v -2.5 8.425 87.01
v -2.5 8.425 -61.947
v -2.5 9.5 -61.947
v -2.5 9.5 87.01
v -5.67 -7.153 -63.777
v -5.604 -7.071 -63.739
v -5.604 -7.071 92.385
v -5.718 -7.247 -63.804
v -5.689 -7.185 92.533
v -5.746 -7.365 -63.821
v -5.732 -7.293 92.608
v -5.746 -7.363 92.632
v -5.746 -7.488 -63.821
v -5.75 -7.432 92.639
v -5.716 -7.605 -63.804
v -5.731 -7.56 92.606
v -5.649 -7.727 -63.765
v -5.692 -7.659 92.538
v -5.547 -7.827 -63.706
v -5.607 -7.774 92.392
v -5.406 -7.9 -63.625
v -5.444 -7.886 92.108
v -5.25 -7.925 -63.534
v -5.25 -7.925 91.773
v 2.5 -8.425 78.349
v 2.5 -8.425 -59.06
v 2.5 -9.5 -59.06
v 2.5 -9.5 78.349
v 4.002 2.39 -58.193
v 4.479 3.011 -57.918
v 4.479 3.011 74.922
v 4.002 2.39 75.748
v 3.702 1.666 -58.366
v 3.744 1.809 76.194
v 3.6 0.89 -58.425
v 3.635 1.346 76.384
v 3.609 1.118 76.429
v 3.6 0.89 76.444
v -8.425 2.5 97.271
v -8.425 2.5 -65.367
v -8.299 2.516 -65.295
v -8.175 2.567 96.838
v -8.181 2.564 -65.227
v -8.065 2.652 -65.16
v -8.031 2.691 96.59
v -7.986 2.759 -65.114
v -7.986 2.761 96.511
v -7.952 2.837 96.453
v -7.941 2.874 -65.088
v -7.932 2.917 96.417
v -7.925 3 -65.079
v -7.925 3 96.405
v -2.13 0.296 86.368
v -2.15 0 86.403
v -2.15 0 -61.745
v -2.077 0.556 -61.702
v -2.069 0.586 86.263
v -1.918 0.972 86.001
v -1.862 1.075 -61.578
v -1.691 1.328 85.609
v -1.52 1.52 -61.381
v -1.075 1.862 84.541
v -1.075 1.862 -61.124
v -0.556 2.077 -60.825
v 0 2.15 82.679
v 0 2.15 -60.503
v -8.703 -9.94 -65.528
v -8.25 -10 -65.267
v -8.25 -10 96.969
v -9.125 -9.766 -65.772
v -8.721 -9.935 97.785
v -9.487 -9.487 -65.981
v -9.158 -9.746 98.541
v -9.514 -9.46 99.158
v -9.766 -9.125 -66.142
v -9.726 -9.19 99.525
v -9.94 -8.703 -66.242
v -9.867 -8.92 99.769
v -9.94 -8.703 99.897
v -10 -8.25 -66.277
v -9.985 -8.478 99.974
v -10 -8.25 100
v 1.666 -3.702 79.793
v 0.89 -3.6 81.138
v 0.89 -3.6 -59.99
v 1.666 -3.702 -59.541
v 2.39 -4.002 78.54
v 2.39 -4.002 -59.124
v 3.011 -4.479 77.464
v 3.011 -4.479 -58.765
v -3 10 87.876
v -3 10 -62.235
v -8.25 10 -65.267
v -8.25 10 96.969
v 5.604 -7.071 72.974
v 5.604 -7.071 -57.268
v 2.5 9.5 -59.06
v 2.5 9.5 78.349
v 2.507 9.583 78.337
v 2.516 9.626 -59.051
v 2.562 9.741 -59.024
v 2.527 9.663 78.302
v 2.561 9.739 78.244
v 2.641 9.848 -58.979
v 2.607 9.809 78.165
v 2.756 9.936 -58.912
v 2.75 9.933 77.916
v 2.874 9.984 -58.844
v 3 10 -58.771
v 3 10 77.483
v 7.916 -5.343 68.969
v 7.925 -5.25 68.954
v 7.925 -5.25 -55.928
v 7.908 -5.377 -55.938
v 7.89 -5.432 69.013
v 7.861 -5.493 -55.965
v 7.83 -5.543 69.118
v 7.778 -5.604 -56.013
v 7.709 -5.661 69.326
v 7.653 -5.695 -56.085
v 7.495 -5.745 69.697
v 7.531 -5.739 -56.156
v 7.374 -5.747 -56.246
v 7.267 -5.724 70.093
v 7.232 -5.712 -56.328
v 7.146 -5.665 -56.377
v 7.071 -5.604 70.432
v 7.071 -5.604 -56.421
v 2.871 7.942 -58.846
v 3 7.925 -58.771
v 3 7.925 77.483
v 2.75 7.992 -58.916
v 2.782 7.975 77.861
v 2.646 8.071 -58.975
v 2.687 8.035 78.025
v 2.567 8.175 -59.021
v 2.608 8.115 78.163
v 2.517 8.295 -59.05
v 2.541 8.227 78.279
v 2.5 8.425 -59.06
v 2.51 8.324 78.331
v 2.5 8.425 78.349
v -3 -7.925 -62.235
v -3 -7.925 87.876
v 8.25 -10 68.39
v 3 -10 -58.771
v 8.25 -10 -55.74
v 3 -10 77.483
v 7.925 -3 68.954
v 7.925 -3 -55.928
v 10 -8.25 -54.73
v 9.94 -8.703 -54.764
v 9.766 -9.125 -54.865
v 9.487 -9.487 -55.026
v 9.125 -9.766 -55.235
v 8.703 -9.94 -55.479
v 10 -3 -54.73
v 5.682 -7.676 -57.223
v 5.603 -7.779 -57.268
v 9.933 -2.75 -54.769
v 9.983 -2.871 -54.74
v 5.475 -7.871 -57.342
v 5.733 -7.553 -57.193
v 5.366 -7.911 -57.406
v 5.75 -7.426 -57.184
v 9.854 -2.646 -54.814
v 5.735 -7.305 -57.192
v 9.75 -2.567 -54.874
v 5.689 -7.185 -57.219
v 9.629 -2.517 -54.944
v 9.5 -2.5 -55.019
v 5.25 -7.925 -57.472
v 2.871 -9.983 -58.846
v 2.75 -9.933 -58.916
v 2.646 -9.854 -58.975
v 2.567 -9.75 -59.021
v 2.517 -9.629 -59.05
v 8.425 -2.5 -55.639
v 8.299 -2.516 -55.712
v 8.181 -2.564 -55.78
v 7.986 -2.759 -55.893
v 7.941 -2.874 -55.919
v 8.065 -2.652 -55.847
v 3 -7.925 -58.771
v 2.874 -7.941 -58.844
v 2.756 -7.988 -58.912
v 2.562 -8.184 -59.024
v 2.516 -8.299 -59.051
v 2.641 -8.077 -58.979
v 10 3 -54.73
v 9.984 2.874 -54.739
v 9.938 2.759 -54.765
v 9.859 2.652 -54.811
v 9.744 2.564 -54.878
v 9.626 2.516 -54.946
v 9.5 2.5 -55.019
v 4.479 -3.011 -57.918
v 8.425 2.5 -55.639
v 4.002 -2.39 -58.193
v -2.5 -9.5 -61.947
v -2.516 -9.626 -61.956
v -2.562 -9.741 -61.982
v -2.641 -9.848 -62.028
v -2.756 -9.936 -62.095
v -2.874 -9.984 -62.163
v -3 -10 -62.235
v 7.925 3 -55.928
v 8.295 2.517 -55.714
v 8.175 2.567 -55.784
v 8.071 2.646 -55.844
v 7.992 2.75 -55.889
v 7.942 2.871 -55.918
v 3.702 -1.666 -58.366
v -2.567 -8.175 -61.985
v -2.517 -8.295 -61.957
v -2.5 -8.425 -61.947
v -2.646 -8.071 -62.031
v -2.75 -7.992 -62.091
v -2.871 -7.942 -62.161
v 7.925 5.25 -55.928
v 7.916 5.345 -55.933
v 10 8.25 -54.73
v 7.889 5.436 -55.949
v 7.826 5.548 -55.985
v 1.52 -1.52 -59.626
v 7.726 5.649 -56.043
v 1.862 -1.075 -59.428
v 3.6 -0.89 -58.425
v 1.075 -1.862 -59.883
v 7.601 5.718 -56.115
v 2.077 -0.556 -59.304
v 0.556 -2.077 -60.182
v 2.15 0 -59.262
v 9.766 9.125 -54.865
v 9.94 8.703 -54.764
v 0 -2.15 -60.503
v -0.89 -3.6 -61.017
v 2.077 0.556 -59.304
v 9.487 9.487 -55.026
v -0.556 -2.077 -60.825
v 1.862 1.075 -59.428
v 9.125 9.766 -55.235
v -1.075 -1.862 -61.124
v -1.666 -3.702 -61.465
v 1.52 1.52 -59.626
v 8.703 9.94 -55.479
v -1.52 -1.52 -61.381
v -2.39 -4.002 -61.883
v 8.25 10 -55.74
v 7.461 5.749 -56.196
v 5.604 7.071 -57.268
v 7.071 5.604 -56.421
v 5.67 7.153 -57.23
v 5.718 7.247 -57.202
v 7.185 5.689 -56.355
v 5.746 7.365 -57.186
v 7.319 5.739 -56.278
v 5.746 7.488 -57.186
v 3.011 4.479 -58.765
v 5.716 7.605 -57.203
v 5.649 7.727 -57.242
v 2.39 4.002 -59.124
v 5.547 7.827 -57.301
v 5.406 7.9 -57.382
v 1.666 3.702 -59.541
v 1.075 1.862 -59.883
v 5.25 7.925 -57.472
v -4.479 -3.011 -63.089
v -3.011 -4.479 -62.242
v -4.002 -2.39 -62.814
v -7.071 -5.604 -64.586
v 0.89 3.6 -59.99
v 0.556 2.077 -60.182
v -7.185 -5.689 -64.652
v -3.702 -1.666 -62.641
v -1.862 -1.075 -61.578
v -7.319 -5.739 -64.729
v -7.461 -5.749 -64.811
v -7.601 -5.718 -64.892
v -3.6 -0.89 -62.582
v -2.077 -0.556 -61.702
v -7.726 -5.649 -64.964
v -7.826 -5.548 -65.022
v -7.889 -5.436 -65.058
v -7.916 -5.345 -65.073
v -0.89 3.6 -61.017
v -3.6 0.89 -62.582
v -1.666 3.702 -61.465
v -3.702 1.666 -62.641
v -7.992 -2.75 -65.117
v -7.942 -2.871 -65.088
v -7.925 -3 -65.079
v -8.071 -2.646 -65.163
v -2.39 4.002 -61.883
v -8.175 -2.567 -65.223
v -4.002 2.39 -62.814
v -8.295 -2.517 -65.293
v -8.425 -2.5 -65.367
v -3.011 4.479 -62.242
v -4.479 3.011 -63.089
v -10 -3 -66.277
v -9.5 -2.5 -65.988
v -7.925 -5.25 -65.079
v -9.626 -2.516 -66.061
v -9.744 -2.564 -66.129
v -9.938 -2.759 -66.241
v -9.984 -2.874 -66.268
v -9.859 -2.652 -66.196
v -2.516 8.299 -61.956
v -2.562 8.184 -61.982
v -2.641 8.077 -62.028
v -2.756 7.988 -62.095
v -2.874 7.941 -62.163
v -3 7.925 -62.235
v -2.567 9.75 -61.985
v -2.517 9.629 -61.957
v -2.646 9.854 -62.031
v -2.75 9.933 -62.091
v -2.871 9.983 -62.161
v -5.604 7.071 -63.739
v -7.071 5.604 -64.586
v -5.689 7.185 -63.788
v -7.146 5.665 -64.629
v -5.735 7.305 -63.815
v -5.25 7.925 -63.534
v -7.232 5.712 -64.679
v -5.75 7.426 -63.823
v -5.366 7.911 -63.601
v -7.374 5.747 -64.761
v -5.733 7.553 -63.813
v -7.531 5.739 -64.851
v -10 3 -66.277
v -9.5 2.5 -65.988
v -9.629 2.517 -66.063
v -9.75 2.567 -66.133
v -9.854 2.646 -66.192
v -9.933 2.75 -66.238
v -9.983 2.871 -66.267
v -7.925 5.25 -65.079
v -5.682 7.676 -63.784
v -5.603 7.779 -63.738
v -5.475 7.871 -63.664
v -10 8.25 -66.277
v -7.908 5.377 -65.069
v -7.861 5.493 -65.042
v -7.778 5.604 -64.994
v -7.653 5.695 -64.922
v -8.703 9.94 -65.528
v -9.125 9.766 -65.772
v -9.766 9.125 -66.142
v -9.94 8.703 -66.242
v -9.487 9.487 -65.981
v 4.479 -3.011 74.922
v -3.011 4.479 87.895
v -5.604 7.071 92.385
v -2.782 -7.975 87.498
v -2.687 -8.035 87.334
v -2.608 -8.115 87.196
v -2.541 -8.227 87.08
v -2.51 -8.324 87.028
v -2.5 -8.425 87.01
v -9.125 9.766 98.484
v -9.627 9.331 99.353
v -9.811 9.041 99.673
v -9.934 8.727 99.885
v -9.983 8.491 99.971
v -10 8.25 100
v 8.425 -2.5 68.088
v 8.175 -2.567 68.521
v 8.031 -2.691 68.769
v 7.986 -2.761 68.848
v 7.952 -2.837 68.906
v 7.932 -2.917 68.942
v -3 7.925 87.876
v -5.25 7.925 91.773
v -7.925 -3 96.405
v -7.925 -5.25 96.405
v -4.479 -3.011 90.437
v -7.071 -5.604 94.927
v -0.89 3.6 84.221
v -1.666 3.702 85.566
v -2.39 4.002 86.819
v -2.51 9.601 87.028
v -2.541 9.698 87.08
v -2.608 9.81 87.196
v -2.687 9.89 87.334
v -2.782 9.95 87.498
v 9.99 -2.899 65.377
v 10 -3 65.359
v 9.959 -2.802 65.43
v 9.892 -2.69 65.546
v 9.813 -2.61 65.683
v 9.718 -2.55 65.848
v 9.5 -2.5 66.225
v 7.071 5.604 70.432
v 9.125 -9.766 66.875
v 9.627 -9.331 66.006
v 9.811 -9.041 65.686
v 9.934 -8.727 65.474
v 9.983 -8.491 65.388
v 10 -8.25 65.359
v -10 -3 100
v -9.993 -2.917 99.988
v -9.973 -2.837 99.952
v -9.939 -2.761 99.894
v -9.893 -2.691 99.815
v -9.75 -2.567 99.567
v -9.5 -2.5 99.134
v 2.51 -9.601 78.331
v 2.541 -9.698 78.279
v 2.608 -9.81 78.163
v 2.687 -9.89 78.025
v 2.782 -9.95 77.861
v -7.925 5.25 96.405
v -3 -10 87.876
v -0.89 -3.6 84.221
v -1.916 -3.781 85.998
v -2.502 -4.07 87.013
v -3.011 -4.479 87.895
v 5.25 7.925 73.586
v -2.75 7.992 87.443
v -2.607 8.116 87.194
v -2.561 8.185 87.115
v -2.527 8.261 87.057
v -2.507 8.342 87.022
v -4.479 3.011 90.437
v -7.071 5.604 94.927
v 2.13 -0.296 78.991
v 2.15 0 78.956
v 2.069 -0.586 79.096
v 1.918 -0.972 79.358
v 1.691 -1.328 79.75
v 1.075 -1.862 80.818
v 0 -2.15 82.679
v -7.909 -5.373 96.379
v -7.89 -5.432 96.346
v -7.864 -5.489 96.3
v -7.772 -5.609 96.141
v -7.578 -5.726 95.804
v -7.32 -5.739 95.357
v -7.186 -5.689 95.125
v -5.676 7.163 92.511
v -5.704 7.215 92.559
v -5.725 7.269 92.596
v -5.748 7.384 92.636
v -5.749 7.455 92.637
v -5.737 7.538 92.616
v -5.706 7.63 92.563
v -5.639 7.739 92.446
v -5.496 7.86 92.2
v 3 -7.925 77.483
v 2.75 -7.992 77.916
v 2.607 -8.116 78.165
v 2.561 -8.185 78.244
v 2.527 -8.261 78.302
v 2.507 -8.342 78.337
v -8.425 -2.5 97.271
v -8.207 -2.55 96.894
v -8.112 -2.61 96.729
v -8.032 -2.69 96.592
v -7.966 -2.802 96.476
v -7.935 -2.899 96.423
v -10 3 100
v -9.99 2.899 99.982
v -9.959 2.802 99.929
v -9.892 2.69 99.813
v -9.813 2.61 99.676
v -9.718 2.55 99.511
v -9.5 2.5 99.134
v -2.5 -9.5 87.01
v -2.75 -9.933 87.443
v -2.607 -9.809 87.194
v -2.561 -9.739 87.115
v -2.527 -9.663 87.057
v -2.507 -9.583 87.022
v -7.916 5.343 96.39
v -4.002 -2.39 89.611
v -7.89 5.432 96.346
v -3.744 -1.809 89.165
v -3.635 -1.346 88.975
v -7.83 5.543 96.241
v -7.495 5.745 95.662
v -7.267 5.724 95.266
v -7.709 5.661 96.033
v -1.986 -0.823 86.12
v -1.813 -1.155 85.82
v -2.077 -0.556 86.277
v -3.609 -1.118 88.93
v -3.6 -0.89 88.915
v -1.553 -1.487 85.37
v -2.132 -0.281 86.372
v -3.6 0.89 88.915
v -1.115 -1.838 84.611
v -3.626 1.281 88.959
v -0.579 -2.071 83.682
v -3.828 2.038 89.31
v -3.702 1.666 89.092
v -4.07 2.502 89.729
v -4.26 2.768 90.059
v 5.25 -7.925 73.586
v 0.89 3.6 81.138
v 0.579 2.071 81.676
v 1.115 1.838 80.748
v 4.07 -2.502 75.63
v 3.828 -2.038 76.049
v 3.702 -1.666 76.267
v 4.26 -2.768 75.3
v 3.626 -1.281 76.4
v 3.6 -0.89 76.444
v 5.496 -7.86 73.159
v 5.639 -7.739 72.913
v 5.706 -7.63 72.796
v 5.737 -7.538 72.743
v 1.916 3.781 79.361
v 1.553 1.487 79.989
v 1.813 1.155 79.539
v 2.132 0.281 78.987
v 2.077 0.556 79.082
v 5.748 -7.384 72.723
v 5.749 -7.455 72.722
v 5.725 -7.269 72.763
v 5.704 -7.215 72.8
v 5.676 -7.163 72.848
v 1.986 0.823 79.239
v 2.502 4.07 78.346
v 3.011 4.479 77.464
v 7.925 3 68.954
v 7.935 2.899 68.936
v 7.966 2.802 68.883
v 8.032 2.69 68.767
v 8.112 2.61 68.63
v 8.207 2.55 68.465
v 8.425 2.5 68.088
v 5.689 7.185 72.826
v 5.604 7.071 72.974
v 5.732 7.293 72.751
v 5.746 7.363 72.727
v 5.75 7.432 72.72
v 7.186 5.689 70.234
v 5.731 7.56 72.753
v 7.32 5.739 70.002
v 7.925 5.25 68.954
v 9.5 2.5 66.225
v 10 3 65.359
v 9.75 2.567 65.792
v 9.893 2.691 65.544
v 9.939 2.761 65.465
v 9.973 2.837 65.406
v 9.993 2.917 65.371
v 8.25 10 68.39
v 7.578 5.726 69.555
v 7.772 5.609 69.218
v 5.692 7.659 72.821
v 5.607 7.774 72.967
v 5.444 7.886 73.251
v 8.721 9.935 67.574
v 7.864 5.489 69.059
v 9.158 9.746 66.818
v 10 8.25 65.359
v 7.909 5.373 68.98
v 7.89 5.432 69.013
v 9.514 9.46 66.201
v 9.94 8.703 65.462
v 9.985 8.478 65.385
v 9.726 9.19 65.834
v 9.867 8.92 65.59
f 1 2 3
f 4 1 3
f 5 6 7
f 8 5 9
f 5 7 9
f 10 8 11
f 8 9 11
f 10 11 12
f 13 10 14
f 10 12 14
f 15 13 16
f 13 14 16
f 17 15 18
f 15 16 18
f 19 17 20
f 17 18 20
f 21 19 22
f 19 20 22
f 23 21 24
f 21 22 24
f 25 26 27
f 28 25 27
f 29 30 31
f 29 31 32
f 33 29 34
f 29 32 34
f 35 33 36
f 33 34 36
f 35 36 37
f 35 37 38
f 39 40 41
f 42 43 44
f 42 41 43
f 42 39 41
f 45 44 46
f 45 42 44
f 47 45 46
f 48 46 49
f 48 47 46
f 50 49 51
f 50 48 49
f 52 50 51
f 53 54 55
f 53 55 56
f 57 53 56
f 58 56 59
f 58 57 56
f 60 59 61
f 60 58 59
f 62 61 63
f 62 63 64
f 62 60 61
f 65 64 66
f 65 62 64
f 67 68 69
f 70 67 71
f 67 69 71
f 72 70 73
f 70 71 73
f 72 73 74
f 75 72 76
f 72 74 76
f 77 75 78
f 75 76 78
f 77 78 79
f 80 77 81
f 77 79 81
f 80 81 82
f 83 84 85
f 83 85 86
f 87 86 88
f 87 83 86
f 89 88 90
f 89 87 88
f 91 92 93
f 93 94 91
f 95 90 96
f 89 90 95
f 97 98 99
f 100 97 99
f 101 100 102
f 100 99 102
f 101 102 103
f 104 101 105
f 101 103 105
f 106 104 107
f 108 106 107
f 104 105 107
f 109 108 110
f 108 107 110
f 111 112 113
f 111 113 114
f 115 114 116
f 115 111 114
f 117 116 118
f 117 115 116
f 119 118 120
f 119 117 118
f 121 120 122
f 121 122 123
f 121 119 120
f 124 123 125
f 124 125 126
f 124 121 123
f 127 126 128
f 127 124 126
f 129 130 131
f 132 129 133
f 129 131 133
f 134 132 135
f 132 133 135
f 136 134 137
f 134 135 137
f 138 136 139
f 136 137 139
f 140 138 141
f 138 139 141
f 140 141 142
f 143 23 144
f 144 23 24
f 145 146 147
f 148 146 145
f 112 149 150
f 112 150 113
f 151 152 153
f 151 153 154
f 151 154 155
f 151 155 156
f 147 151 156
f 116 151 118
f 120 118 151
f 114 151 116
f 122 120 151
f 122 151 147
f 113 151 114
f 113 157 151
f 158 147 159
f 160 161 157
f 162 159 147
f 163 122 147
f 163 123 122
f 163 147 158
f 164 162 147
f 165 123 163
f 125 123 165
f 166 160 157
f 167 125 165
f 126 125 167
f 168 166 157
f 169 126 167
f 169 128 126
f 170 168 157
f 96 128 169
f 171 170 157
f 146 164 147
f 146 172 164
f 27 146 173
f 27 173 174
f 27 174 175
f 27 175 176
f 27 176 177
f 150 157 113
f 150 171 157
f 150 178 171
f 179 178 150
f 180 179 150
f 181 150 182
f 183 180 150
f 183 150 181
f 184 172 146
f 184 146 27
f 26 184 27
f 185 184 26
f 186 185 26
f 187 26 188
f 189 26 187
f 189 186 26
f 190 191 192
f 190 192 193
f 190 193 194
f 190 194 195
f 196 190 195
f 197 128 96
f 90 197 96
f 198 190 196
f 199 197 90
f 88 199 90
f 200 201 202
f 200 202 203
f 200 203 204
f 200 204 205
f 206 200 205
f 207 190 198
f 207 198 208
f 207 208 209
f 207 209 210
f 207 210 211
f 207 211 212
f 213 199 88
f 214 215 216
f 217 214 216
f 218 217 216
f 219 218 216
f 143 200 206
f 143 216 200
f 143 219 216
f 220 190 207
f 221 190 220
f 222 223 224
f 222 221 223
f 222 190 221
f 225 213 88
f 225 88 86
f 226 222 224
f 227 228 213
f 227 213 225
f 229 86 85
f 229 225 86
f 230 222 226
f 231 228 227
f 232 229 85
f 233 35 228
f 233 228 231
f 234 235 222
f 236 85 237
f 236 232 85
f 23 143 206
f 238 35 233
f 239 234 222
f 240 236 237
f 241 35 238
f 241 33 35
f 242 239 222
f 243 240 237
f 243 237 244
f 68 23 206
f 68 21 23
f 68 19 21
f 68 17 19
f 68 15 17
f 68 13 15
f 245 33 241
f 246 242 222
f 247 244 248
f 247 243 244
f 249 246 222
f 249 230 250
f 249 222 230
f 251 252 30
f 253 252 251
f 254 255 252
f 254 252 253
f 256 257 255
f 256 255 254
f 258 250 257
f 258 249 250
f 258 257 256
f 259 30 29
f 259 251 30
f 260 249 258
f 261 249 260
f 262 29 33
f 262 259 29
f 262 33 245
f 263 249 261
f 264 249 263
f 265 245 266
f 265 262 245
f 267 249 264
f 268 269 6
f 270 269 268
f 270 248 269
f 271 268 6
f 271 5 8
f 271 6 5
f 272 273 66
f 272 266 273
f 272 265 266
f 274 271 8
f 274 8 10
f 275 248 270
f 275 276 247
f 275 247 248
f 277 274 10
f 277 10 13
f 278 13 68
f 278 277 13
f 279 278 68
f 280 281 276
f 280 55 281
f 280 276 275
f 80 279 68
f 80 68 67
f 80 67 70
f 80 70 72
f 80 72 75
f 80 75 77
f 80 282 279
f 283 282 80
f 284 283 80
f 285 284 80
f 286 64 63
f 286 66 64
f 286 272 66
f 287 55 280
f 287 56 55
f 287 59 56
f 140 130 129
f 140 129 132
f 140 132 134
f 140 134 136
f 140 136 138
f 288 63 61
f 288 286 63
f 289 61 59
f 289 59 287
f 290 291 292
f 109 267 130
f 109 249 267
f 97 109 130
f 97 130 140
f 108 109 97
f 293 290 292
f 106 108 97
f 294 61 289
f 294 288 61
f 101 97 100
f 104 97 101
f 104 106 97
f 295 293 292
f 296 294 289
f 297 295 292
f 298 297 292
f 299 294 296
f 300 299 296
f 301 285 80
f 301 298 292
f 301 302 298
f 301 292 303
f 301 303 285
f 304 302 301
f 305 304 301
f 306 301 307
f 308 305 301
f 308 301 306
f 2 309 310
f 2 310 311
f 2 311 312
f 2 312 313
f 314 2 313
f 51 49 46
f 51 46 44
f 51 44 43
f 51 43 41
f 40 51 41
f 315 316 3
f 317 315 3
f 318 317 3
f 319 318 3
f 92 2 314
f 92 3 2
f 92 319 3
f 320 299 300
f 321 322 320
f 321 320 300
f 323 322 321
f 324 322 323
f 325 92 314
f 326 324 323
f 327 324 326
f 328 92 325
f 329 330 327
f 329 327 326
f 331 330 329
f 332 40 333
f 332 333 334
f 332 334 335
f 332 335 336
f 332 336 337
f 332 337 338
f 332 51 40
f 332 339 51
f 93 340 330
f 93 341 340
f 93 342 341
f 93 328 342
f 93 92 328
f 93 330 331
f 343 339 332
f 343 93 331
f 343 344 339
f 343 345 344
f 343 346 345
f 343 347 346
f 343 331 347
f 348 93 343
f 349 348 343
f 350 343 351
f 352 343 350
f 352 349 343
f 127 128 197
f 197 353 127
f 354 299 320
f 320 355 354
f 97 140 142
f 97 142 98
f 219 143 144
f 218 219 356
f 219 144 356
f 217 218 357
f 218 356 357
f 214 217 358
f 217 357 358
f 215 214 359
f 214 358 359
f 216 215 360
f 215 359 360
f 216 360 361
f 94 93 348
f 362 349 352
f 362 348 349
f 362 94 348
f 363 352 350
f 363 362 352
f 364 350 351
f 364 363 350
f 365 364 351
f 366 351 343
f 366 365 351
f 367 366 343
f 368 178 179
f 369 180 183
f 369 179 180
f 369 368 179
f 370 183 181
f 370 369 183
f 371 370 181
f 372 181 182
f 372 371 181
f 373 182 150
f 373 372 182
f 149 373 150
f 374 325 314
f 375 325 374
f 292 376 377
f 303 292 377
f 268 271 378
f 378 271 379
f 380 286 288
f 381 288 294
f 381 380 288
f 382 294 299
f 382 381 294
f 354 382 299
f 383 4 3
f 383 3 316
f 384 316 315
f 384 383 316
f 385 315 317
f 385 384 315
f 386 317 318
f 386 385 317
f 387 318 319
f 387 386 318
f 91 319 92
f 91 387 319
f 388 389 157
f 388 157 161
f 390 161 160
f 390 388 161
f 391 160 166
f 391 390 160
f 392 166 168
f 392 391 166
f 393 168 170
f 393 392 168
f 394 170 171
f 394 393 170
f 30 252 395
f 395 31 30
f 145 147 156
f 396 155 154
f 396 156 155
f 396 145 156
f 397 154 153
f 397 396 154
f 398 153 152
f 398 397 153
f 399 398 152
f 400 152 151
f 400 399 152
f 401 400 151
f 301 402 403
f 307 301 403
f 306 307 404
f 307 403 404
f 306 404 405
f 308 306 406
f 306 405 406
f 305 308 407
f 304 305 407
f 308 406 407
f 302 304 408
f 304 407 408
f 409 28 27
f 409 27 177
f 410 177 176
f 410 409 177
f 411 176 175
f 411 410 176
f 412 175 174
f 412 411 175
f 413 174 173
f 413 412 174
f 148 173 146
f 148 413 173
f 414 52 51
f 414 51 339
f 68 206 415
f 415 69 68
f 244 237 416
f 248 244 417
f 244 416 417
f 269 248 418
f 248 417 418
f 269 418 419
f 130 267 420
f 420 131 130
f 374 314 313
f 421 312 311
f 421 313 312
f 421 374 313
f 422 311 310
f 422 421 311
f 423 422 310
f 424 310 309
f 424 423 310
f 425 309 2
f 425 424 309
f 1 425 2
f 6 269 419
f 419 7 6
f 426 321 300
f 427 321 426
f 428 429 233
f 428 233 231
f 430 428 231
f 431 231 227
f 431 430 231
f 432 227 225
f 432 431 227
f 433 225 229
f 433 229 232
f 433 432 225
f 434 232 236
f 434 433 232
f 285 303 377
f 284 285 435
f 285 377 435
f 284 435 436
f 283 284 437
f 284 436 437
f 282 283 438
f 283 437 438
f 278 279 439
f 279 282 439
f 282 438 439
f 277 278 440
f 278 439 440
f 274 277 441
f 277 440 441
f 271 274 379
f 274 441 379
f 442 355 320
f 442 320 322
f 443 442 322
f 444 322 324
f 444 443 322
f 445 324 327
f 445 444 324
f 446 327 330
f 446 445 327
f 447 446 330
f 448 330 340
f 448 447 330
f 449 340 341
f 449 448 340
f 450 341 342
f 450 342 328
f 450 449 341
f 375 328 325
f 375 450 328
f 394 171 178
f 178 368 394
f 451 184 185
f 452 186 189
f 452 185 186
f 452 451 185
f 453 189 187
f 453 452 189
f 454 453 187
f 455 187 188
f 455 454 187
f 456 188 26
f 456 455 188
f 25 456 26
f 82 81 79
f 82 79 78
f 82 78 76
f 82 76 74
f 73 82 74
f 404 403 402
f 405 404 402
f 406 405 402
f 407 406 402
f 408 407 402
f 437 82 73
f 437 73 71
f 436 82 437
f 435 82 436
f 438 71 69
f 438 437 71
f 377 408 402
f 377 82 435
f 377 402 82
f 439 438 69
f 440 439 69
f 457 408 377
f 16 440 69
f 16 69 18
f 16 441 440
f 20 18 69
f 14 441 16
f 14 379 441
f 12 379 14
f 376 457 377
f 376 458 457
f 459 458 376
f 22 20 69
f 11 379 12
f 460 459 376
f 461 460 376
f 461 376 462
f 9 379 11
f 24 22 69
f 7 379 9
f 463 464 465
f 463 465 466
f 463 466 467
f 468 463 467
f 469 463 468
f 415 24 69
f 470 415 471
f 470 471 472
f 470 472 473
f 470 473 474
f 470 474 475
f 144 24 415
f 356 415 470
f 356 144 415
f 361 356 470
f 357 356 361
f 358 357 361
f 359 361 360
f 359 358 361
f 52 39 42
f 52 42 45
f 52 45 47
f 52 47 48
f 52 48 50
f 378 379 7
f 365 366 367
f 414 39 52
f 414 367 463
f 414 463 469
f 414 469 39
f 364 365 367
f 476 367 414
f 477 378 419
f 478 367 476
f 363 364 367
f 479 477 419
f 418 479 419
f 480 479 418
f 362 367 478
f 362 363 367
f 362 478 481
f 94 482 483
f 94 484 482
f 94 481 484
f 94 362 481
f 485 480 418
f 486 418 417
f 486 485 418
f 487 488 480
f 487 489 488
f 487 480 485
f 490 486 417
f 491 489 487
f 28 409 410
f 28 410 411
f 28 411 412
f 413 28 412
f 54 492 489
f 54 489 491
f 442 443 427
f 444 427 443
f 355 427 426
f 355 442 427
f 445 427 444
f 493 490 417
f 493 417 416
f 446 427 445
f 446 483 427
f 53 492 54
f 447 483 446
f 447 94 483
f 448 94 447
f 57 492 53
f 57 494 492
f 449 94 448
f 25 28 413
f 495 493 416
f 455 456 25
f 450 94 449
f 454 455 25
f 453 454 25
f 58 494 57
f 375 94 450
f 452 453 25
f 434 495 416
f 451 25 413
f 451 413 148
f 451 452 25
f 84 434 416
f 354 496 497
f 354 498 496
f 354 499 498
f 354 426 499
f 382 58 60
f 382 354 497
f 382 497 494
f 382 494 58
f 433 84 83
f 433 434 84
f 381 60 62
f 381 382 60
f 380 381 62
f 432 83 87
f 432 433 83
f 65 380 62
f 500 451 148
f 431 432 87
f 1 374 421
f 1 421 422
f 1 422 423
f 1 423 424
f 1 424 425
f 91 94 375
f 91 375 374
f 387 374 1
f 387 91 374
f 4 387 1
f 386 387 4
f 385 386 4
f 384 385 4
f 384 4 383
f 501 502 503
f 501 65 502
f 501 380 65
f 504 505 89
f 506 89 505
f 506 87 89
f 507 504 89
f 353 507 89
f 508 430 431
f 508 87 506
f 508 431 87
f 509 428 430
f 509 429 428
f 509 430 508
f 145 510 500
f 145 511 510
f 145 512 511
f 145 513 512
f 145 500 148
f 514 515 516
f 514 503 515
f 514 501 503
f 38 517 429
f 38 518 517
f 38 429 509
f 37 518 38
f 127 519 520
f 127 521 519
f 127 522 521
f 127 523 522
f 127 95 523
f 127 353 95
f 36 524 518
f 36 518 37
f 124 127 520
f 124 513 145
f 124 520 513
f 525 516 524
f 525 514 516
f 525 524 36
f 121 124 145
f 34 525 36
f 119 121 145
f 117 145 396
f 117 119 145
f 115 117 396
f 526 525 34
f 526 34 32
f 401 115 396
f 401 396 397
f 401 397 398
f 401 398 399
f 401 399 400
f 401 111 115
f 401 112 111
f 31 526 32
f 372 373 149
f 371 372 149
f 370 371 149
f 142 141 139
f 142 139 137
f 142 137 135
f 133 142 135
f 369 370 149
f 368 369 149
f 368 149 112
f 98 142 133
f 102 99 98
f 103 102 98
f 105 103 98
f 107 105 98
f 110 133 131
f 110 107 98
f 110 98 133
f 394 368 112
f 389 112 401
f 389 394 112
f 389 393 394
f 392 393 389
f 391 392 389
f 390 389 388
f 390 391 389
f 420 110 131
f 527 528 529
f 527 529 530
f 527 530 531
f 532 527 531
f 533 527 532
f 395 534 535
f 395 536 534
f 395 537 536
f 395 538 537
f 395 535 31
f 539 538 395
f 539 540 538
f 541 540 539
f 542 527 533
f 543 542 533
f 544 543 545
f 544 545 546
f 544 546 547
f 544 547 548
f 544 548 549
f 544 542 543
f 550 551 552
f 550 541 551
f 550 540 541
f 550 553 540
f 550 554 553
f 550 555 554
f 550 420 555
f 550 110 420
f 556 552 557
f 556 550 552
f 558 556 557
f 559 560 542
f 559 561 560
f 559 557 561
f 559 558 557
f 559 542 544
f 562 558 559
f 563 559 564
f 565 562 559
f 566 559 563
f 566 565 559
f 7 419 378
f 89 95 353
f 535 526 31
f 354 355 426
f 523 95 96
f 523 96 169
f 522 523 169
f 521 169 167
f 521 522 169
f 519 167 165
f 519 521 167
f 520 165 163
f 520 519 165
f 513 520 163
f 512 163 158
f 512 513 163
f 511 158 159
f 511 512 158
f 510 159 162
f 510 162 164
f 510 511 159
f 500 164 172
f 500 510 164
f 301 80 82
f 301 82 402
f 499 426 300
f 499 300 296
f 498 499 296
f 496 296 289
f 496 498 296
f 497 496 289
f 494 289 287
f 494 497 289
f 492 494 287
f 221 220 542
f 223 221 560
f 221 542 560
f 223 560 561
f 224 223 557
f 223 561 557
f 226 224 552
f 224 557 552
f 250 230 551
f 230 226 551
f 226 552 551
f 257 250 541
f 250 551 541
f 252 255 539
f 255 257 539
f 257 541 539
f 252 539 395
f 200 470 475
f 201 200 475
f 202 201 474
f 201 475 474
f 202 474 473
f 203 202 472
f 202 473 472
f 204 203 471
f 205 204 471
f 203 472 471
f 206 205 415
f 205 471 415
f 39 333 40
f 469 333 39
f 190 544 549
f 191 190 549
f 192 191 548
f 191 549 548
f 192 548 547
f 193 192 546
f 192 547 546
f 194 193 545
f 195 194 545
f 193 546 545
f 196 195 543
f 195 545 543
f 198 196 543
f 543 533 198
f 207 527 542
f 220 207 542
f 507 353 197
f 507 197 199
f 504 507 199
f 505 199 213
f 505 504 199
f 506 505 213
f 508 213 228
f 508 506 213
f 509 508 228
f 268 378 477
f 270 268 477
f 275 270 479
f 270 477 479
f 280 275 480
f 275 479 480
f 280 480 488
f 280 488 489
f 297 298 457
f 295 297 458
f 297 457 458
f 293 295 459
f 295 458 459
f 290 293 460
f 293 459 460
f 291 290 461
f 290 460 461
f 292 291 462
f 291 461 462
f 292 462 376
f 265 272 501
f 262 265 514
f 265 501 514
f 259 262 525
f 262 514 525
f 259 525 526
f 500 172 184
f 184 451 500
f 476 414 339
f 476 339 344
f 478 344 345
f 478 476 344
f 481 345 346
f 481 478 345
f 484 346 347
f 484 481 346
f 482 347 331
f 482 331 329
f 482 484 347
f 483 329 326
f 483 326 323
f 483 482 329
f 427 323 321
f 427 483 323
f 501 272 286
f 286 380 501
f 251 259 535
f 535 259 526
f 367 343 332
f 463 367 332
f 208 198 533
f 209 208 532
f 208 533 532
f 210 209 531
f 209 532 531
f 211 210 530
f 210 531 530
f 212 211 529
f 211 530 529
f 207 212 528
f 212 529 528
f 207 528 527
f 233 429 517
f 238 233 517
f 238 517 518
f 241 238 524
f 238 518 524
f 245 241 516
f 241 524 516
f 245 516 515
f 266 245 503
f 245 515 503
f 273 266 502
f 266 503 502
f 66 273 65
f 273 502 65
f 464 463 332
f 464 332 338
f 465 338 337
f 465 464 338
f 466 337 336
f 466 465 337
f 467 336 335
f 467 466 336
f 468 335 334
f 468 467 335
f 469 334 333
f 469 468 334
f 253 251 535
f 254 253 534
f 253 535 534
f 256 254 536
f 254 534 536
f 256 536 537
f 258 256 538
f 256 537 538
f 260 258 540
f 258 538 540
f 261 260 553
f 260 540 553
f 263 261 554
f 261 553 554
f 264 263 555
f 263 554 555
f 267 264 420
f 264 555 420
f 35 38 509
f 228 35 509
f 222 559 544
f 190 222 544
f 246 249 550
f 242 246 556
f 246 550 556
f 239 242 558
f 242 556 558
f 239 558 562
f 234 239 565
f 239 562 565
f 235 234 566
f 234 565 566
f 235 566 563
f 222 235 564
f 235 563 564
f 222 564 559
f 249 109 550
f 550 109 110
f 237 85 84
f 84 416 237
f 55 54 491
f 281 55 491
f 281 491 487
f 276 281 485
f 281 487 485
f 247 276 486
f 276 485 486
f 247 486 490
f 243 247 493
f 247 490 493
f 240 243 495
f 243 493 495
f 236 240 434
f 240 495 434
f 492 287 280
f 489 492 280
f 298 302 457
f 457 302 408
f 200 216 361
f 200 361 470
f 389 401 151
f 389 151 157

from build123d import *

# Parameters (mm, degrees)
BOSS_EXTRUDE1_DEPTH = 100
SKETCH5_OUTSIDE_W   = 62.398
SKETCH5_OUTSIDE_H   = 242.398
CUT_EXTRUDE1_DEPTH  = 21


with BuildPart() as part:
    # Sketch4 → Boss-Extrude1 (new body, symmetric)
    with BuildSketch(Plane.XY):
        with BuildLine():
            Line((3, -10), (8.25, -10))
            ThreePointArc((8.25, -10), (9.487436867, -9.487436867), (10, -8.25))
            Line((10, -8.25), (10, -3))
            ThreePointArc((10, -3), (9.853553391, -2.646446609), (9.5, -2.5))
            Line((9.5, -2.5), (8.424621202, -2.5))
            ThreePointArc((8.424621202, -2.5), (8.071067812, -2.646446609), (7.924621202, -3))
            Line((7.924621202, -3), (7.924621202, -5.25))
            ThreePointArc((7.924621202, -5.25), (7.615962919, -5.711939766), (7.071067812, -5.603553391))
            Line((7.071067812, -5.603553391), (4.478679656, -3.011165235))
            ThreePointArc((4.478679656, -3.011165235), (3.828361402, -2.037895189), (3.6, -0.889844892))
            Line((3.6, -0.889844892), (3.6, 0))
            Line((3.6, 0), (2.15, 0))
            ThreePointArc((2.15, 0), (1.52027958, -1.52027958), (0, -2.15))
            Line((0, -2.15), (0, -3.6))
            Line((0, -3.6), (0.889844892, -3.6))
            ThreePointArc((0.889844892, -3.6), (2.037895189, -3.828361402), (3.011165235, -4.478679656))
            Line((3.011165235, -4.478679656), (5.603553391, -7.071067812))
            ThreePointArc((5.603553391, -7.071067812), (5.711939766, -7.615962919), (5.25, -7.924621202))
            Line((5.25, -7.924621202), (3, -7.924621202))
            ThreePointArc((3, -7.924621202), (2.646446609, -8.071067812), (2.5, -8.424621202))
            Line((2.5, -8.424621202), (2.5, -9.5))
            ThreePointArc((2.5, -9.5), (2.646446609, -9.853553391), (3, -10))
        make_face()
    extrude(amount=BOSS_EXTRUDE1_DEPTH, both=True)

    # Mirror1: part across plane


with BuildPart() as part_1:
    add(part.part)
    add(part.part.mirror(Plane(origin=(0, 0, 0), x_dir=(0, 0, 1), z_dir=(1, 0, 0))))

    # Mirror2: part across plane


with BuildPart() as part_2:
    add(part_1.part)
    add(part_1.part.mirror(Plane.ZX))

    # Sketch5 outside → Cut-Extrude1 (cut, through all)
    with BuildSketch(Plane(origin=(0, 10, 0), x_dir=(1, 0, 0), z_dir=(0, 1, 0))):
        Rectangle(SKETCH5_OUTSIDE_W, SKETCH5_OUTSIDE_H)
        Polygon((-10, -100), (62, 24.707658145), (-11.612159322, 67.207658145), align=None, mode=Mode.SUBTRACT)
    extrude(amount=-CUT_EXTRUDE1_DEPTH, mode=Mode.SUBTRACT)


solid = part_2.part
